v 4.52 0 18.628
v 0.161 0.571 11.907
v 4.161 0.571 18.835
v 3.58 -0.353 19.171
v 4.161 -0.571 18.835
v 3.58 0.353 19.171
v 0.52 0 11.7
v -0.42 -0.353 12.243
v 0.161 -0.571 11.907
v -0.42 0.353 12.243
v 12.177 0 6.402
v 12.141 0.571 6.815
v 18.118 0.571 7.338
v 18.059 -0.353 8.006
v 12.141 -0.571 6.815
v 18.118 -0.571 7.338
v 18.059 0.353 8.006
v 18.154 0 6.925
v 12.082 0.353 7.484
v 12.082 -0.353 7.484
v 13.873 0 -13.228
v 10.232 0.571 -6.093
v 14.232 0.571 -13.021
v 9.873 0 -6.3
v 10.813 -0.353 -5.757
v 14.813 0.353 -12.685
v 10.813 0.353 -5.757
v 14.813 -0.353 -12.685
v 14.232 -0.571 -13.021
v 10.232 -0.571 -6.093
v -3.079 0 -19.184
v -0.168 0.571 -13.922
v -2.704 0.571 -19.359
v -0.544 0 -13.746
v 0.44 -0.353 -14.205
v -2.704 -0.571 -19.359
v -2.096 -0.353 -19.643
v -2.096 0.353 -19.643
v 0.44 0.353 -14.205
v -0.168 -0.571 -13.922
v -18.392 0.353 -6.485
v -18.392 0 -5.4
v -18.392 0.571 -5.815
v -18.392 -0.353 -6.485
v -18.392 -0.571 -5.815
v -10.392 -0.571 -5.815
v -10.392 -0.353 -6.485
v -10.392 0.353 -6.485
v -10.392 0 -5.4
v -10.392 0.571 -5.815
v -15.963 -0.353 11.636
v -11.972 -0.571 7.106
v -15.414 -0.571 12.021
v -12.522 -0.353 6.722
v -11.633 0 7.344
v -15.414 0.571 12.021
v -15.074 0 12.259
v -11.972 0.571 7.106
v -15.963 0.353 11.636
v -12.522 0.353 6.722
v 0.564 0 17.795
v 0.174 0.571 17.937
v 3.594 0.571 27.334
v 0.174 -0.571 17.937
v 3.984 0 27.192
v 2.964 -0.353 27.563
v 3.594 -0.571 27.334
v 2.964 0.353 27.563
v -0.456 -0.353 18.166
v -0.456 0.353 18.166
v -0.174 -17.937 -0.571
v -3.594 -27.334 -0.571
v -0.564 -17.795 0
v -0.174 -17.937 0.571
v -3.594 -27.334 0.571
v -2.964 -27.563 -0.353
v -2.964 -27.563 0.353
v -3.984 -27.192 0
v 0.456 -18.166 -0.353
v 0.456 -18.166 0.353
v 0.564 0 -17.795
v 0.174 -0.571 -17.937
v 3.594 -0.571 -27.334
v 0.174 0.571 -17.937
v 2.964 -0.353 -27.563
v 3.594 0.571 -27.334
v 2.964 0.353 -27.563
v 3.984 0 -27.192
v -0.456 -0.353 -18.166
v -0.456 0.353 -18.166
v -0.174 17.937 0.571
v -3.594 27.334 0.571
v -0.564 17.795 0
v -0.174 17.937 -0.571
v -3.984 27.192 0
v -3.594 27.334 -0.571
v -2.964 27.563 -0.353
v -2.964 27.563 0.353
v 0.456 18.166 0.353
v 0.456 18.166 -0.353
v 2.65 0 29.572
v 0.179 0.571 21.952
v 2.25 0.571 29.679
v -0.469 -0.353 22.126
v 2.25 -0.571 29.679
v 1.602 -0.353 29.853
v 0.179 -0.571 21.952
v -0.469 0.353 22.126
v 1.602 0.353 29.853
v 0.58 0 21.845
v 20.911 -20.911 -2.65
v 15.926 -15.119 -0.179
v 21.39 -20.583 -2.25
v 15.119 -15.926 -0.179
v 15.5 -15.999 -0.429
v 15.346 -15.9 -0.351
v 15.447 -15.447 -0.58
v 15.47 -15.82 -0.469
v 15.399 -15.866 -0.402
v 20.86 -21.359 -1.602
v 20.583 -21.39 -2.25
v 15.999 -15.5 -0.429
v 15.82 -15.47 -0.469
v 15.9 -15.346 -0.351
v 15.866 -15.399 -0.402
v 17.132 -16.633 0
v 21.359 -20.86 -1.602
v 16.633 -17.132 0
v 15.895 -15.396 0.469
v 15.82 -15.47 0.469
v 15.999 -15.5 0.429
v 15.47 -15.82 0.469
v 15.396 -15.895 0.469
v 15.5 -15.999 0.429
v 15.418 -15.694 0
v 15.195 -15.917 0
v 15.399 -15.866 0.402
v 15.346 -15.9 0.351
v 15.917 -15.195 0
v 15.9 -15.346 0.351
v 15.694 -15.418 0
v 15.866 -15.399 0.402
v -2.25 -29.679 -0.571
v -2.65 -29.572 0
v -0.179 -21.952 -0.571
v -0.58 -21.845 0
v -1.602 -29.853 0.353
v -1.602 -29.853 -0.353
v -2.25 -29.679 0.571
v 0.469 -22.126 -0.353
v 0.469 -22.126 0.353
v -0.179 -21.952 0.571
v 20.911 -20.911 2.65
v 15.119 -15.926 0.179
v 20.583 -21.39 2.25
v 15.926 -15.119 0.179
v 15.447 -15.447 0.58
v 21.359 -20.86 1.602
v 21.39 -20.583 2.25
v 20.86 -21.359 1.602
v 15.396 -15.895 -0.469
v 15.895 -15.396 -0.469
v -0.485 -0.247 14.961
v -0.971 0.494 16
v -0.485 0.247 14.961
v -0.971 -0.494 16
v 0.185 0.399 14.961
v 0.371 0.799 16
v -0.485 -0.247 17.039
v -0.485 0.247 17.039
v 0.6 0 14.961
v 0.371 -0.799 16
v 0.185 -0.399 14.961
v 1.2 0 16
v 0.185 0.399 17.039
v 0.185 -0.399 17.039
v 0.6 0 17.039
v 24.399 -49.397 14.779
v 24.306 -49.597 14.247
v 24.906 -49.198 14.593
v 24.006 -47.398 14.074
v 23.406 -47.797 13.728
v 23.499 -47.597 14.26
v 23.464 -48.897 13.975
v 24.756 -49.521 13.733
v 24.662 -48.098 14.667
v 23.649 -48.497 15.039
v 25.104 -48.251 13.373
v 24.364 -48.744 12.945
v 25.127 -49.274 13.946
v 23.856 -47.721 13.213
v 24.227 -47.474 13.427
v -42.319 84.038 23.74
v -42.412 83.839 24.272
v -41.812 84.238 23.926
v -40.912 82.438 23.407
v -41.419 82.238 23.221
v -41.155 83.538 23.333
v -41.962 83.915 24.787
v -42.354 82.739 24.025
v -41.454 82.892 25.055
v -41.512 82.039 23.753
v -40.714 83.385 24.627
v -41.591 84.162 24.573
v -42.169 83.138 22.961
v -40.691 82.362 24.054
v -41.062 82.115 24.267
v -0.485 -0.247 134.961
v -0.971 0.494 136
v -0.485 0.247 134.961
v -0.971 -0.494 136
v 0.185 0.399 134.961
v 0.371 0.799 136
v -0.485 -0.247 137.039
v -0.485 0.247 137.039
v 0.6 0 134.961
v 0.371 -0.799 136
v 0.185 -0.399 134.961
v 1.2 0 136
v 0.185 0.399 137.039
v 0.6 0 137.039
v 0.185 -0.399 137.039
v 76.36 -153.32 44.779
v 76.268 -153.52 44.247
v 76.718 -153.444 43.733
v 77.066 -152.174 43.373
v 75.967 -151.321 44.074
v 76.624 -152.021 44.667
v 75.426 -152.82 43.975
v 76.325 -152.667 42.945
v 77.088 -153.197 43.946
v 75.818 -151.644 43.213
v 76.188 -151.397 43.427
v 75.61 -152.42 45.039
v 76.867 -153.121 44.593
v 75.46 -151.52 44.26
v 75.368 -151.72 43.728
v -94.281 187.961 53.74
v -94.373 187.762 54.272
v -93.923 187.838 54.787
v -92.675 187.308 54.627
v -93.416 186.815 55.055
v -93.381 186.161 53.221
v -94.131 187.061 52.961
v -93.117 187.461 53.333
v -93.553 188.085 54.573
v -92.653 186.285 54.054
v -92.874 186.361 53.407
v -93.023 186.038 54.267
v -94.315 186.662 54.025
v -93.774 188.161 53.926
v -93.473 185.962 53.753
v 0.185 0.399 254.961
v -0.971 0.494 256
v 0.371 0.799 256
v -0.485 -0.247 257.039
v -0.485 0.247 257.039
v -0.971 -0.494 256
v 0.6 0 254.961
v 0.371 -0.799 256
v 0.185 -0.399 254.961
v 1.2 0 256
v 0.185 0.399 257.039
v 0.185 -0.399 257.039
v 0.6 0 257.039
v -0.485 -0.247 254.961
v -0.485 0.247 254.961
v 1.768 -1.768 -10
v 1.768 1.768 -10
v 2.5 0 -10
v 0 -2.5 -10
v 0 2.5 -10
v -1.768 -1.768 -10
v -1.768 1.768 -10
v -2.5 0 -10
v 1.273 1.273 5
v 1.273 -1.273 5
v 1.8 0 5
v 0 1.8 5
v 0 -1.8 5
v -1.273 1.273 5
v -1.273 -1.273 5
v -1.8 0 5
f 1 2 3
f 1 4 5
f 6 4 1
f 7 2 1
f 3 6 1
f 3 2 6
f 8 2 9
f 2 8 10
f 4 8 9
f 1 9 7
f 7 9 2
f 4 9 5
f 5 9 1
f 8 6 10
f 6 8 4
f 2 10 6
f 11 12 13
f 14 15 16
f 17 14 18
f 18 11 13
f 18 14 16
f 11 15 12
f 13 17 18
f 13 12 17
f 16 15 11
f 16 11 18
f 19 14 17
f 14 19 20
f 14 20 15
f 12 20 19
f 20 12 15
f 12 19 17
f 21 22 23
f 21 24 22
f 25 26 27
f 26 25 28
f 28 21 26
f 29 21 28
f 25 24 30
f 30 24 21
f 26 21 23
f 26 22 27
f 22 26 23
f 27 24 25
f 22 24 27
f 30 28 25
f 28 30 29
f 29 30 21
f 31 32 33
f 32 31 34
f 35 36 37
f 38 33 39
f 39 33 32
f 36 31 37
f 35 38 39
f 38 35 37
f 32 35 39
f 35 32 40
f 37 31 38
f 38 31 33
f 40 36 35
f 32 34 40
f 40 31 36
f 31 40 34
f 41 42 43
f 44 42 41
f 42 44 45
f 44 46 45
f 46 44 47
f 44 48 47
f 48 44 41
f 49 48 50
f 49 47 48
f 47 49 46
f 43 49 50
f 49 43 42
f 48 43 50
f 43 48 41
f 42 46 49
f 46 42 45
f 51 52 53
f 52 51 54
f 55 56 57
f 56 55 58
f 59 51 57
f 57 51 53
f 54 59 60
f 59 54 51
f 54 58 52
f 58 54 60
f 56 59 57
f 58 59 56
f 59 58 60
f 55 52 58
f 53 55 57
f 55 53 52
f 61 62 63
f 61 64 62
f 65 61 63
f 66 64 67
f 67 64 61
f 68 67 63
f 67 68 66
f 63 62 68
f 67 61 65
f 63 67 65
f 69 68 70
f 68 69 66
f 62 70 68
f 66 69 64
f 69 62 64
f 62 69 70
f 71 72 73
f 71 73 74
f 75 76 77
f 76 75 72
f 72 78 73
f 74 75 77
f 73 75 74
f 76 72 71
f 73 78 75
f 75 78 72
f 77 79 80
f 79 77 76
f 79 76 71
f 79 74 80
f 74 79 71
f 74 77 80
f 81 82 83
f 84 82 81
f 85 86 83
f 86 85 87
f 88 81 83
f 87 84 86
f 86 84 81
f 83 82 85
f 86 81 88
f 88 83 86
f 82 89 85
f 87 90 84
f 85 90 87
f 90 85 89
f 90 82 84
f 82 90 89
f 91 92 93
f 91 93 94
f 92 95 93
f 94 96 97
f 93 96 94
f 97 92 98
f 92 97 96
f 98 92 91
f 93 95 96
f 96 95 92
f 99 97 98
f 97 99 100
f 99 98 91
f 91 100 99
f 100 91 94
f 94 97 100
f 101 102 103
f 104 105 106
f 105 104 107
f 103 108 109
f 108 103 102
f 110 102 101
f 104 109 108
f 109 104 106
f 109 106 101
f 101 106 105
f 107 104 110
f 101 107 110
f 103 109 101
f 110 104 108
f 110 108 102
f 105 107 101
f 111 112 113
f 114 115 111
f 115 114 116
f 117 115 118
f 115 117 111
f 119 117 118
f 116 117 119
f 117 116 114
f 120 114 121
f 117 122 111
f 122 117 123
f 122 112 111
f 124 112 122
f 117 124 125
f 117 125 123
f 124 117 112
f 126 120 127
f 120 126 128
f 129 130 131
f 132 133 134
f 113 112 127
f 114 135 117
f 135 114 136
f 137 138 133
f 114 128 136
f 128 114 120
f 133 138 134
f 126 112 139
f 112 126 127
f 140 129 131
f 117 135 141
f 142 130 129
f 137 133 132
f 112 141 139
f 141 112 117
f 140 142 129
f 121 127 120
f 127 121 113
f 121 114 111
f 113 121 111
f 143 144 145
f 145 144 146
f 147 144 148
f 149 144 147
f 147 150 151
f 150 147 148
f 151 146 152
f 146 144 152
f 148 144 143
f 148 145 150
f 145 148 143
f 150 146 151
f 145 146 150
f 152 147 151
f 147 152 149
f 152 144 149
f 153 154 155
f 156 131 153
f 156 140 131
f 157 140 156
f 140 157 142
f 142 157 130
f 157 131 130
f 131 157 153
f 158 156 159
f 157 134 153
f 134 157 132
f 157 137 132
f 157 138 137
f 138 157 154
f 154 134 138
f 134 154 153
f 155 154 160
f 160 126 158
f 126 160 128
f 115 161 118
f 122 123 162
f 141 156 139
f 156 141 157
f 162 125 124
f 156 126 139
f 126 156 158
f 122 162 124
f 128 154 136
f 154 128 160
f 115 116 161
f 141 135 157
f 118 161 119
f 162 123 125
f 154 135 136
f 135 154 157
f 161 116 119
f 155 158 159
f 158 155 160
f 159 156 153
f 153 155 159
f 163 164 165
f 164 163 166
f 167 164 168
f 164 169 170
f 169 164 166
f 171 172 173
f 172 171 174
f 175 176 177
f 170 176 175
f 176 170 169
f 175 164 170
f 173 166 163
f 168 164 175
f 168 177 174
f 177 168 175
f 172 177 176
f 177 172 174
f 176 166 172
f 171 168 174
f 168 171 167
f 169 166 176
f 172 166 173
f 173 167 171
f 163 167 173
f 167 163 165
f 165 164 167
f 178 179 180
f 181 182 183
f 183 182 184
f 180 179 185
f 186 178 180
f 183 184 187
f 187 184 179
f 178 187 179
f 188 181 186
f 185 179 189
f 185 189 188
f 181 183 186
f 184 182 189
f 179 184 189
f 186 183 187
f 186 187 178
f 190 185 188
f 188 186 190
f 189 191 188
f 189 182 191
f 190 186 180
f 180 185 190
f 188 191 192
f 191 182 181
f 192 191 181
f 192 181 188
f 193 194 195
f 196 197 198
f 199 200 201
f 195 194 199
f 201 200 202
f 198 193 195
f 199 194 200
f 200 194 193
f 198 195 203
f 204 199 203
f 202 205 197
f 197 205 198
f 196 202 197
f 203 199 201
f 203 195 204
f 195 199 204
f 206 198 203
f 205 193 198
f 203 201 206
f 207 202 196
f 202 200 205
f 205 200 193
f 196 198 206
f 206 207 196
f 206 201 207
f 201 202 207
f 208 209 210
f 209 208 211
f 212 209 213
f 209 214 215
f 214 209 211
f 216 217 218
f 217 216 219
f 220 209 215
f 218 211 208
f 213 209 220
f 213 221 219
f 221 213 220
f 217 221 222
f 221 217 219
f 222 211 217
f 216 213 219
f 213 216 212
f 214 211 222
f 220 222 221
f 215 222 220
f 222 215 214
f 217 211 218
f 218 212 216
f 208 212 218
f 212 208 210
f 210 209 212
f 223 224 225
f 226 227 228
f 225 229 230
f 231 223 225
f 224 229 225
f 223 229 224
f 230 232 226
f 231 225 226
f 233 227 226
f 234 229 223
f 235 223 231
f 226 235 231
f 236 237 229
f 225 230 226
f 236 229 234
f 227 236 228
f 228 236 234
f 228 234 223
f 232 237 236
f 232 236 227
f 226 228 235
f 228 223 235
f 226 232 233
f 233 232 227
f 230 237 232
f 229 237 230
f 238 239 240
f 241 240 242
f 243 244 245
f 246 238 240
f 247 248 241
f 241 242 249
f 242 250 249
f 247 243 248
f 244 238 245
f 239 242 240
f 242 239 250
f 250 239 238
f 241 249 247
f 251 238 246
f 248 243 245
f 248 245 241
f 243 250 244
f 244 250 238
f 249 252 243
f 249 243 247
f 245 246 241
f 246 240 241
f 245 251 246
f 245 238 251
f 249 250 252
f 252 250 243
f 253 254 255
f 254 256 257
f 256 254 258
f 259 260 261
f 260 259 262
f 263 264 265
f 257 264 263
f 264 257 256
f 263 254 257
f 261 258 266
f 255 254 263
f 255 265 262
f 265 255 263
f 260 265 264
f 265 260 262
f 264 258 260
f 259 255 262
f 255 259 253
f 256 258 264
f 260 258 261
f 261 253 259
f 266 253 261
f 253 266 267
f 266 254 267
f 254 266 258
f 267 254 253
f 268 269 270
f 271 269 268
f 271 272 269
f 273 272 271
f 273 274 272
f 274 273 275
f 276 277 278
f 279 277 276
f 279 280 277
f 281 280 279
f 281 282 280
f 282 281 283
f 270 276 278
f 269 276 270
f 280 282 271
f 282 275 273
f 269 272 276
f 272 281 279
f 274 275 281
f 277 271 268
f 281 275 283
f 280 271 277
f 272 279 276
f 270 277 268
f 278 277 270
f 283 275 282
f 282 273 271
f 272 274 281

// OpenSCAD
// Generated by CadMonkey
// Prompt: hey cadmonkey, create me a tree
// Generated at: 2025-11-12 00:36:34

// Tree model using standard OpenSCAD primitives

module trunk() {
    // Main trunk with slight taper
    cylinder(h=15, r1=2.5, r2=1.8, center=false);
}

module branch(length, angle) {
    // Branch with natural curve
    rotate([0, angle, 0]) 
        cylinder(h=length, r=0.6, center=false);
}

module leaf() {
    // Simple leaf shape
    scale([1, 0.7, 1])
        sphere(r=1.2);
}

// Main tree assembly
union() {
    // Trunk
    color("brown")
    translate([0, 0, -10])
        trunk();
    
    // Primary branches
    color("darkgreen") {
        // First set of branches
        for(i = [0:120:240]) {
            rotate([0, i, 0]) 
                translate([0, 0, 12])
                    branch(8, 30);
            
            rotate([0, i+60, 0]) 
                translate([0, 0, 14])
                    branch(6, 25);
        }
        
        // Second set of branches (higher up)
        for(j = [0:90:270]) {
            rotate([j, j*2, 0]) 
                translate([0, 0, 18])
                    branch(10, 20);
        }
        
        // Top branches
        for(k = [0:45:135]) {
            rotate([k, k*2, 0]) 
                translate([0, 0, 22])
                    branch(8, 15);
        }
    }
    
    // Leaves distributed along branches
    color("green") {
        for(l = [0:360/3:720]) {
            rotate([l, l*2, 0]) 
                translate([0, 0, 16 + l/3])
                    leaf();
        }
    }
}
